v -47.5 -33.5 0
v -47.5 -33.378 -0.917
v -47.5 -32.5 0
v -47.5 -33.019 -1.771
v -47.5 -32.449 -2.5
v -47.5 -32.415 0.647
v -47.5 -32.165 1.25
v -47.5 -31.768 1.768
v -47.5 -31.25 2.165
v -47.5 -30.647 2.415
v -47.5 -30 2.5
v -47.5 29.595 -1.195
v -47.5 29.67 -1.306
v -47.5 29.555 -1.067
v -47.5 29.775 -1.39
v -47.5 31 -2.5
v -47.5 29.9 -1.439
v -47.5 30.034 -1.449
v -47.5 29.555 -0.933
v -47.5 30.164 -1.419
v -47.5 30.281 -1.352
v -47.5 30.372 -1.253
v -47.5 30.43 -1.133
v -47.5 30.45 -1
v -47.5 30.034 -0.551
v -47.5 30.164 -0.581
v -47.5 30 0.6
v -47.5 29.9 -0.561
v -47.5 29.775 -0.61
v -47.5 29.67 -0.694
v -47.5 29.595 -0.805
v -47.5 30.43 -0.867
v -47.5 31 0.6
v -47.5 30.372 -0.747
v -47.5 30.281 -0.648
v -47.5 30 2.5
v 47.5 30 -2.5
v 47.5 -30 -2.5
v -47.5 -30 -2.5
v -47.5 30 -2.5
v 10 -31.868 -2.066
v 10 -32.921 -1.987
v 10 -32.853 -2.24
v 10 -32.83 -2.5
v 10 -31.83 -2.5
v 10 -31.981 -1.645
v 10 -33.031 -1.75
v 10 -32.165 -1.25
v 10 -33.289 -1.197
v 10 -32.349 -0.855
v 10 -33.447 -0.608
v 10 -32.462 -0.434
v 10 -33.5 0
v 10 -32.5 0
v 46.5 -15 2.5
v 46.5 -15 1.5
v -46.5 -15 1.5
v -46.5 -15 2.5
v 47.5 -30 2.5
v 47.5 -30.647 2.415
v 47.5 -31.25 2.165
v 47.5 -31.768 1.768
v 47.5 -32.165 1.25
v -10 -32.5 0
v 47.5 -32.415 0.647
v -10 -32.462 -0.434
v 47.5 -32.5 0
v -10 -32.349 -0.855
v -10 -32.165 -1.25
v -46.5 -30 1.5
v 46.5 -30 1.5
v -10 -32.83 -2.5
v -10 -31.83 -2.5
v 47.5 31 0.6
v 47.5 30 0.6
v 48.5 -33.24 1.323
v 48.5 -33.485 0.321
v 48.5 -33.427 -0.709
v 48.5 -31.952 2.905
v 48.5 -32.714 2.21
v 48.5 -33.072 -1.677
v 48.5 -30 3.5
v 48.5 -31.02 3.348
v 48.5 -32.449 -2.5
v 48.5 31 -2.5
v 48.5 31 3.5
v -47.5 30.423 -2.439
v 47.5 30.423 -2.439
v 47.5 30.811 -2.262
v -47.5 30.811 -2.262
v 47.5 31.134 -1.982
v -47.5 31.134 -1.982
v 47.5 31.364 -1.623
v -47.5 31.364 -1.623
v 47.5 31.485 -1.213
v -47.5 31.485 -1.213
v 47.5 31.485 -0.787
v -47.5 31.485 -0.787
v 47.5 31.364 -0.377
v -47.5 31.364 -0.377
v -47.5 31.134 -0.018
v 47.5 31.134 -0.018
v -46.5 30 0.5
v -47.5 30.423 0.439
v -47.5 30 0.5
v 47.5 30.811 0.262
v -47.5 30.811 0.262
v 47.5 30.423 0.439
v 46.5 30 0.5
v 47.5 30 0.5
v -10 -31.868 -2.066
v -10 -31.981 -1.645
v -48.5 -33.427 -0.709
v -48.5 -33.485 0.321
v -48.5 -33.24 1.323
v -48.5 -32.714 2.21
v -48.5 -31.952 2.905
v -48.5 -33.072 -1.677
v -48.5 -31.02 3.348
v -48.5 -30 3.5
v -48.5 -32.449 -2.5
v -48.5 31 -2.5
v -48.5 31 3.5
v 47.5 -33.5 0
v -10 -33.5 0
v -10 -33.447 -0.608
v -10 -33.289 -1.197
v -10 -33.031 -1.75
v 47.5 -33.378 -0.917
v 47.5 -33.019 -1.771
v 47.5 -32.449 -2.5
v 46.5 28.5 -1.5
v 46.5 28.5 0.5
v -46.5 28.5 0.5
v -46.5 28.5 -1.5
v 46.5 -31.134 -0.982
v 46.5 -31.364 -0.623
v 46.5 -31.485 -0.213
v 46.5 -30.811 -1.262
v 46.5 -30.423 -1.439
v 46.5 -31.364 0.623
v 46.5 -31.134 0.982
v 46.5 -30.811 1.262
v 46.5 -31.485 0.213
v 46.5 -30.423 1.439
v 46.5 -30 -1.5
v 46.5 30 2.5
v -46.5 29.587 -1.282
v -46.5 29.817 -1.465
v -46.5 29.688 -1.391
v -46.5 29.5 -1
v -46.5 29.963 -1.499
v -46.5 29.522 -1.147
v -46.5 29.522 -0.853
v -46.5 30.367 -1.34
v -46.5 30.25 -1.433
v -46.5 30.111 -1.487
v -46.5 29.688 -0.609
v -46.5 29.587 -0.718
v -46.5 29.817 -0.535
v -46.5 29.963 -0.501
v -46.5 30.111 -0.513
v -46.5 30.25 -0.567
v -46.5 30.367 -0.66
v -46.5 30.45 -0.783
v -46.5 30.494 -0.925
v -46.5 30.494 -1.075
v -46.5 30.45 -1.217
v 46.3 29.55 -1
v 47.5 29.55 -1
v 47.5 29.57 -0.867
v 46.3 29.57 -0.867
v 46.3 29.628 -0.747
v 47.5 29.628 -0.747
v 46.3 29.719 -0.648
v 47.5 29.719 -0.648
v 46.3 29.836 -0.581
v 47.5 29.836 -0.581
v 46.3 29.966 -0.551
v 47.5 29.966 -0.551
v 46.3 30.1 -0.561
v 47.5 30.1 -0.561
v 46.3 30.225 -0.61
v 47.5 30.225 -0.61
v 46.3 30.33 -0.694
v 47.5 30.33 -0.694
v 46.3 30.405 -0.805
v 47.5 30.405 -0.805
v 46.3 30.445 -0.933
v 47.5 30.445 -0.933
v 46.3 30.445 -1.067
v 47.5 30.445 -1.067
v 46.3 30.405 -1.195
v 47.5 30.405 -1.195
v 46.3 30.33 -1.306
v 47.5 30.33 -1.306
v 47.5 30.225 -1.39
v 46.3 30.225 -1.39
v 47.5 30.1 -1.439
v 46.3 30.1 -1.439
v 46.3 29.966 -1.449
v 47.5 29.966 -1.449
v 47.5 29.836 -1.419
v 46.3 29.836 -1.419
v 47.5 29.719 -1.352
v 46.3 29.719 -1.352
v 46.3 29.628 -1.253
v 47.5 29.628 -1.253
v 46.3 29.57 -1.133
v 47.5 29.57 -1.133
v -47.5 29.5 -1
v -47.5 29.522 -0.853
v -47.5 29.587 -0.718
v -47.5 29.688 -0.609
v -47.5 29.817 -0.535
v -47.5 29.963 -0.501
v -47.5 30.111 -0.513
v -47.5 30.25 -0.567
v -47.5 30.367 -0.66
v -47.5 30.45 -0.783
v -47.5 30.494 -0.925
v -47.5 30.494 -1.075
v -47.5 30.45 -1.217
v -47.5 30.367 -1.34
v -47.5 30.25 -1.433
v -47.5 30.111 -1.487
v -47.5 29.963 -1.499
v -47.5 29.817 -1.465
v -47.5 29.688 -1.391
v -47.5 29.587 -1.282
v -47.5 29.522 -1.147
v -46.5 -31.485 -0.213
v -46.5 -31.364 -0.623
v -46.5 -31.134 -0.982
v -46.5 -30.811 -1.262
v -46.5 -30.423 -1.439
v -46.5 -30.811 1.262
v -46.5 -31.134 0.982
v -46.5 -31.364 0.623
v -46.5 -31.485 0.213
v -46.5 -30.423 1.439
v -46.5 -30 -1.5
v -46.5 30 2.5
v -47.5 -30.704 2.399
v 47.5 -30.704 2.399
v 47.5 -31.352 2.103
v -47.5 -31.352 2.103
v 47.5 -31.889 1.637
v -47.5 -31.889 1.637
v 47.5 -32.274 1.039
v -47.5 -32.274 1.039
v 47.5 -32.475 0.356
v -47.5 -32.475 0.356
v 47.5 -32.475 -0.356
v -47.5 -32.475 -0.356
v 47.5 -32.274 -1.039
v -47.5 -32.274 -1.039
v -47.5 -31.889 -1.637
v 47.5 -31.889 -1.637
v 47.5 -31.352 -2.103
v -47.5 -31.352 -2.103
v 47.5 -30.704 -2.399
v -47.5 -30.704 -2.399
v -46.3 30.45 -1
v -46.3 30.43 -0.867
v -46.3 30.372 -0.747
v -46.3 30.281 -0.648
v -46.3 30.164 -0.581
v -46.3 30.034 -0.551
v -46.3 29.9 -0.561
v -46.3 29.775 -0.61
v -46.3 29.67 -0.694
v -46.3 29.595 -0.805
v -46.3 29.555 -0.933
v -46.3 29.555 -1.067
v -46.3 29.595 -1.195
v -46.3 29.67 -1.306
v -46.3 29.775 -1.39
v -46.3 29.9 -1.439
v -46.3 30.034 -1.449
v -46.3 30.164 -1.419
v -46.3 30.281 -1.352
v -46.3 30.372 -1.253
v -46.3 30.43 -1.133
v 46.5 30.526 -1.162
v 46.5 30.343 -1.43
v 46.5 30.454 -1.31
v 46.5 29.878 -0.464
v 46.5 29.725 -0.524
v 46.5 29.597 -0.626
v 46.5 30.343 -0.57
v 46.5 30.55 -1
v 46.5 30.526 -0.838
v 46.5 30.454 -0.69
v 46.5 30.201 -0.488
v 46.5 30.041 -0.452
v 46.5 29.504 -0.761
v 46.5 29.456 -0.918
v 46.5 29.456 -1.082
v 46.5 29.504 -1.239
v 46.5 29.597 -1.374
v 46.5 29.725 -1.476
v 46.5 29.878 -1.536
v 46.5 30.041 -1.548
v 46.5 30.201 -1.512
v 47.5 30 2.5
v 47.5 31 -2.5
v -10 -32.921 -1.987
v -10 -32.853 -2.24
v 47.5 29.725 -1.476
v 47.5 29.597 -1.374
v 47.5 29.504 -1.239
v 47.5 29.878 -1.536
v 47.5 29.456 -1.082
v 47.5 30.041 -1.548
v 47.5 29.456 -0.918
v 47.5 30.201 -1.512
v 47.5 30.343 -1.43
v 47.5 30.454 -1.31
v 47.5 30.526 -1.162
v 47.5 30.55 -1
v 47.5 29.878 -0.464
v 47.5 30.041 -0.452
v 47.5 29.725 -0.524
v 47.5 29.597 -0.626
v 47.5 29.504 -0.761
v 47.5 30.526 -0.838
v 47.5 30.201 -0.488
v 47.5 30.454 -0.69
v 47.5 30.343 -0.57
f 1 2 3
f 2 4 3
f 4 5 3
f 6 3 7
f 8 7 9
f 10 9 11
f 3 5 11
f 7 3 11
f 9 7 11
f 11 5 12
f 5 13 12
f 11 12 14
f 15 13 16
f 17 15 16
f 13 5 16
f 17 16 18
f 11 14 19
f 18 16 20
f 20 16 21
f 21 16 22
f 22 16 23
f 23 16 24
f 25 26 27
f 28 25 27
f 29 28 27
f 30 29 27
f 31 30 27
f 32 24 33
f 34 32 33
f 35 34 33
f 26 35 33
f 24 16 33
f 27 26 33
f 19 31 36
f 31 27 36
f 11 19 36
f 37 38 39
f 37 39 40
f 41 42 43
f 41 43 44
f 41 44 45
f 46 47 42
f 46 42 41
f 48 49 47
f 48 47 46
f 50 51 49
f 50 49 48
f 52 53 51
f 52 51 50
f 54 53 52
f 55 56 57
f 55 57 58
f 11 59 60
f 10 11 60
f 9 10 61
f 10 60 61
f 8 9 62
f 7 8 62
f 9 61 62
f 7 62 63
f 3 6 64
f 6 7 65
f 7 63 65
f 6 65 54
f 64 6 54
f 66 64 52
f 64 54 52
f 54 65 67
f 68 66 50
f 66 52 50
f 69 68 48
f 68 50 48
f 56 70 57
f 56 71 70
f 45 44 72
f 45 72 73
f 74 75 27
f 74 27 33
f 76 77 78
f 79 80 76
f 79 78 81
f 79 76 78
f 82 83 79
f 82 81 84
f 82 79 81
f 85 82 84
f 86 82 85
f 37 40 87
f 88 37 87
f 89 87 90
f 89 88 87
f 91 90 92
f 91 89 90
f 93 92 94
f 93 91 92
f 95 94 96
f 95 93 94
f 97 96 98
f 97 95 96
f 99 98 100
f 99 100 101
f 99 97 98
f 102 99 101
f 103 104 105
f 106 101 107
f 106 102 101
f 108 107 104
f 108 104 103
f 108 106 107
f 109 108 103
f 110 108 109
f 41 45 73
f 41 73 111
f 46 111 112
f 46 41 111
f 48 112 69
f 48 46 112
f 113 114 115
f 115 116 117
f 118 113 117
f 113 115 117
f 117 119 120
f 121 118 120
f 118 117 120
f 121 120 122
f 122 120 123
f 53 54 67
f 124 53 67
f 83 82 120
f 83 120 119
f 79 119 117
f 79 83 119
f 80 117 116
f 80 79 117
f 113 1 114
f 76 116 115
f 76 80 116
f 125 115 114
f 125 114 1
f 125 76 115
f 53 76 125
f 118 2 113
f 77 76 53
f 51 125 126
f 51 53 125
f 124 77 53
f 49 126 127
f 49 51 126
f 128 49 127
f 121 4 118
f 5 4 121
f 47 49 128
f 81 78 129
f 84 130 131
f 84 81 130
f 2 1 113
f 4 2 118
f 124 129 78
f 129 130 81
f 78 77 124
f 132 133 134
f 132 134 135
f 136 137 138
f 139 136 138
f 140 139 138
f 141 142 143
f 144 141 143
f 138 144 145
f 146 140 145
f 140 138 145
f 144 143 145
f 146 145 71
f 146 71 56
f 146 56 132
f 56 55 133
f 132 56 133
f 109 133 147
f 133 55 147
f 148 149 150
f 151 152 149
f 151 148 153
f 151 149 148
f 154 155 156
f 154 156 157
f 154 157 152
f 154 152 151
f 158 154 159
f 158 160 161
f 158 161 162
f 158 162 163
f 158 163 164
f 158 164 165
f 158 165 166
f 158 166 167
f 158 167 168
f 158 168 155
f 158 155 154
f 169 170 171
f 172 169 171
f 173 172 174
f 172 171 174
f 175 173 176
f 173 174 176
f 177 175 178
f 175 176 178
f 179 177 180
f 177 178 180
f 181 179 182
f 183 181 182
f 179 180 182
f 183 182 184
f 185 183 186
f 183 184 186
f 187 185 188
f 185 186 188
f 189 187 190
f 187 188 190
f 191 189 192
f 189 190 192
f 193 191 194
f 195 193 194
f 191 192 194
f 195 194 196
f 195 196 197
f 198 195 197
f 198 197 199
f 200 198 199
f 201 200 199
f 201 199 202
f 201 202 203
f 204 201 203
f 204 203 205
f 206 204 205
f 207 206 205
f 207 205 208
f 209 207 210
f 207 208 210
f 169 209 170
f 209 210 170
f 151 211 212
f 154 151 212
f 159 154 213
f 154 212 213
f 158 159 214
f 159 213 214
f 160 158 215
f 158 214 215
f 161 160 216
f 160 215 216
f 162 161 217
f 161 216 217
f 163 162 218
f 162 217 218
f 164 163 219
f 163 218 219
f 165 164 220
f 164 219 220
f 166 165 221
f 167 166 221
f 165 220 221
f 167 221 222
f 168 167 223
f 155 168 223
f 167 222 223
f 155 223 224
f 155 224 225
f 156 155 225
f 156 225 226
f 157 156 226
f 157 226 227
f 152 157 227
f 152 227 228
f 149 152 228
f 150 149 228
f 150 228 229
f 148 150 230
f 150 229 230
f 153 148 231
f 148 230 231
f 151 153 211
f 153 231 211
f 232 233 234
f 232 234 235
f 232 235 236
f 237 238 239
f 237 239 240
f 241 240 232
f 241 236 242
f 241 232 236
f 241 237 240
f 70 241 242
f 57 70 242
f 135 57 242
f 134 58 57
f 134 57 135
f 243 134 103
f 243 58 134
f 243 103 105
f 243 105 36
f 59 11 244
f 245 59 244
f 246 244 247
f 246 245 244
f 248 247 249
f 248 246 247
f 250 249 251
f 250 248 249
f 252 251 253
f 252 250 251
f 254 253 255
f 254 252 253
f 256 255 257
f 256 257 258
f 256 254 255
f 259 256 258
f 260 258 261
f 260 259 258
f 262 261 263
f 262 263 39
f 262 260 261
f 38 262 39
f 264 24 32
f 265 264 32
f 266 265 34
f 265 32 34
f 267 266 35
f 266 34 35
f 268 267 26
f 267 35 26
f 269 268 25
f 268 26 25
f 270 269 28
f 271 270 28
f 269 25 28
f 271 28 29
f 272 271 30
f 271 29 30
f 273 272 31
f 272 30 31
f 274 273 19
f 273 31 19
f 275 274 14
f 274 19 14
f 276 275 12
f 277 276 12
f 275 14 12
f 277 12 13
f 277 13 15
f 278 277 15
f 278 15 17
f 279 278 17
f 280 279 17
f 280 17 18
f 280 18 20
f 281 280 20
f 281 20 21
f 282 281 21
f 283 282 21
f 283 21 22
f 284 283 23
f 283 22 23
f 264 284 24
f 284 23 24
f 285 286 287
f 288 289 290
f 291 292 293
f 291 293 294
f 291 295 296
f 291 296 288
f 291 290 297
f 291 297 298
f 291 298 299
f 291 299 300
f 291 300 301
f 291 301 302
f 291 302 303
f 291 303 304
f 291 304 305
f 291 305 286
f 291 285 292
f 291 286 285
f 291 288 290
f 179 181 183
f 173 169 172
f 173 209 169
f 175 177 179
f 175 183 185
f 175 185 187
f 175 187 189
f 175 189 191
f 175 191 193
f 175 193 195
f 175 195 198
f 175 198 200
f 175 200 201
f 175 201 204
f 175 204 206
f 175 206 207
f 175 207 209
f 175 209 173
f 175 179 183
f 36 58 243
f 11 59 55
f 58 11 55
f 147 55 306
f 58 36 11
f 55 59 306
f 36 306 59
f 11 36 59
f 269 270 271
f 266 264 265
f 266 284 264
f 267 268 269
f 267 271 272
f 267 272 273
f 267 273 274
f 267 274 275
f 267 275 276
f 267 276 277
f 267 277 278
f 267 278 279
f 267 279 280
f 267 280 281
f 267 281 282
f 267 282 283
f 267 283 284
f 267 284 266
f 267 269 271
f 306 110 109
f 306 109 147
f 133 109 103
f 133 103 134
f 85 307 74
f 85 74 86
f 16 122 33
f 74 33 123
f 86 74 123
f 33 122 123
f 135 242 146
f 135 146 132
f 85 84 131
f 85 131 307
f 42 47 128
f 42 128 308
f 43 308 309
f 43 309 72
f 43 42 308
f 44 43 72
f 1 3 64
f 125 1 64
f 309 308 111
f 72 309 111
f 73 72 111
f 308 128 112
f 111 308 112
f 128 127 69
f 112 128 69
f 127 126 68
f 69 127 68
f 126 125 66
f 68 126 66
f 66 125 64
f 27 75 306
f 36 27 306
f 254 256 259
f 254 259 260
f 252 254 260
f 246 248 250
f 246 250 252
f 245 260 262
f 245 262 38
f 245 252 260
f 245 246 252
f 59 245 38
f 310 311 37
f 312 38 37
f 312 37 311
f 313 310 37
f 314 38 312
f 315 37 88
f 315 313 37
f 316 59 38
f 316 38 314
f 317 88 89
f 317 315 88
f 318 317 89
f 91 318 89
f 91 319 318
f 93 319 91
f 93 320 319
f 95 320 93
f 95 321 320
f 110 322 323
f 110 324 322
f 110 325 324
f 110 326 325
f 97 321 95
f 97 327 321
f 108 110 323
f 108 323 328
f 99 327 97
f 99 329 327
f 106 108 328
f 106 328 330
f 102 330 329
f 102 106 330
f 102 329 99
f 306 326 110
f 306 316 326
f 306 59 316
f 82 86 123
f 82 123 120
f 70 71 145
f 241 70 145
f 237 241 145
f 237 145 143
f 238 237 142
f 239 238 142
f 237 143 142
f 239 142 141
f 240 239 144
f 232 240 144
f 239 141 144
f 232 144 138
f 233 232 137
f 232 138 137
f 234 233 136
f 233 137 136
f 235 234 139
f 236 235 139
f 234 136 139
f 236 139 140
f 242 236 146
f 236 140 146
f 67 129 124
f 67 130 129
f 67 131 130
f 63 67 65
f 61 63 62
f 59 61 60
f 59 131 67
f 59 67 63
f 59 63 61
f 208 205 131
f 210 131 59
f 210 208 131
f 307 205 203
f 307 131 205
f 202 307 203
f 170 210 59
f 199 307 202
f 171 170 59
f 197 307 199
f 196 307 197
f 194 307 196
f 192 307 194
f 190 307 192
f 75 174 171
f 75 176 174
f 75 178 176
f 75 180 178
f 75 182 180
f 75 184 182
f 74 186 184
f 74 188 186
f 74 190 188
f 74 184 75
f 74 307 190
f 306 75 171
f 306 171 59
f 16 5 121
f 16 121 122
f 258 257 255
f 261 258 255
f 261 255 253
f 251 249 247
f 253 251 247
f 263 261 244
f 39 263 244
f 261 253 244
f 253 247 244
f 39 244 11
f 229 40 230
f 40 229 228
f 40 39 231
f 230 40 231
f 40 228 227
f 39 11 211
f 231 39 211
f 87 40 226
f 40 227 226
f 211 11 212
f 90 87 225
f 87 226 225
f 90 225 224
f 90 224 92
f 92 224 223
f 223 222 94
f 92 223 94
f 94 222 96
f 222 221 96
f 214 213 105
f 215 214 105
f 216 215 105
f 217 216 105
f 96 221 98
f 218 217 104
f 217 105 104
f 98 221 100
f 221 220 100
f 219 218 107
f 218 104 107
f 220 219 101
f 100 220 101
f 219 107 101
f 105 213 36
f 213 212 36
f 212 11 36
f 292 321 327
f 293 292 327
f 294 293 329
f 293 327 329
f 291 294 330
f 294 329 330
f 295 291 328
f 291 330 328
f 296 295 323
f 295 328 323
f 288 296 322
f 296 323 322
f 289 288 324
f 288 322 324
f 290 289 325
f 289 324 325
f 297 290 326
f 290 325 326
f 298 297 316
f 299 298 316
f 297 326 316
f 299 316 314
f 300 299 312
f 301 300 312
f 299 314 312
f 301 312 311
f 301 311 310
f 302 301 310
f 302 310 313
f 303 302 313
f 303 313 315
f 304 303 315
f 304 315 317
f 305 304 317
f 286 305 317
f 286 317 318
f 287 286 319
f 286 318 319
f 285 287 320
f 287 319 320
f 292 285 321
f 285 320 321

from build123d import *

# Parameters (mm, degrees)
F1_DEPTH       = 47.5
F2_T           = 1
F3_W           = 15
F3_H           = 1
F4_DEPTH       = 46.5
F4_DEPTH_BACK  = 46.5
F6_DEPTH       = 47.5
F6_DEPTH_BACK  = 47.5
F7_R           = 0.55
F8_DEPTH       = 1
F9_R           = 0.5
F10_DEPTH      = 1
F12_DEPTH      = 48.5
F13_T          = 1
F15_W          = 37.5
F15_H          = 10.6723425663
F16_DEPTH      = 144
F18_DEPTH      = 20
F20_DEPTH      = 20
F21_W          = 1
F21_H          = 2.9
F22_DEPTH      = 48.5
F22_DEPTH_BACK = 48.5
F23_R          = 0.45
F24_DEPTH      = 1.2
F25_R          = 0.45
F26_DEPTH      = 1.2


# Not quite as in the source:
# - an extrude ends at something that could not be found from the text; its depth is read off the source's solid
# - ends of sketch curves that miss each other by under 0.0002 mm in the source are joined
# - a shell that OpenCascade refuses in one call is made with other operations: the cavity is built on its own and cut out


with BuildPart() as f1:
    # F0 (on Right) → F1 (new body, symmetric)
    with BuildSketch(Plane.YZ):
        with BuildLine():
            Line((30, 2.5), (-30, 2.5))
            ThreePointArc((-30, 2.5), (-32.5, 0), (-30, -2.5))
            Line((-30, -2.5), (30, -2.5))
            Line((30, -2.5), (30, 2.5))
        make_face()
    extrude(amount=F1_DEPTH, both=True)

    # F2: shell of thickness 1, made by hand


with BuildPart() as f2_core1:
    # F2_t2: copy of F1
    add(f1.part)

    # the walls: a layer under each face that stays
    f2_faces = [f2_core1.faces().sort_by_distance(p)[0] for p in [
        (0, 0, -2.5),
        (47.5, -1.25, 0),
        (0, -32.5, 0),
        (-47.5, -1.25, 0),
    ]]
    thicken(f2_faces, amount=-F2_T, mode=Mode.SUBTRACT)


with BuildPart() as f1_1:
    add(f1.part)

    # what is left inside the walls is the cavity
    f2_cavity = [f2_core1.part.solids().sort_by_distance(p)[0] for p in [
        (-15.5, 0, 2.49),
    ]]
    add(f2_cavity, mode=Mode.SUBTRACT)

    # F3 (on Right) → F4 (join, two sides)
    with BuildSketch(Plane.YZ) as f4_sk:
        with Locations((-22.5, 2)):
            Rectangle(F3_W, F3_H)
    extrude(amount=F4_DEPTH)
    extrude(f4_sk.sketch, amount=-F4_DEPTH_BACK)

    # F5 (on Right) → F6 (join, two sides)
    with BuildSketch(Plane.YZ) as f6_sk:
        with BuildLine():
            Line((28.5, -2.5), (29.9848040611, -2.5))
            ThreePointArc((29.9848040611, -2.5), (29.9924019331, -2.4999807563), (30, -2.5))
            Line((30, -2.5), (30, 0.5))
            Line((30, 0.5), (28.5, 0.5))
            Line((28.5, 0.5), (28.5, -2.5))
        make_face()
        with BuildLine():
            Line((30, 0.5), (30, -2.5))
            ThreePointArc((30, -2.5), (31.5, -1), (30, 0.5))
        make_face()
    extrude(amount=F6_DEPTH)
    extrude(f6_sk.sketch, amount=-F6_DEPTH_BACK)

    # F7 (on face) → F8 (cut)
    with BuildSketch(Plane.YZ.offset(47.5)):
        with Locations((30, -1)):
            Circle(F7_R)
    extrude(amount=-F8_DEPTH, mode=Mode.SUBTRACT)

    # F9 (on face) → F10 (cut)
    with BuildSketch(Plane(origin=(-47.5, 0, 0), x_dir=(0, -1, 0), z_dir=(-1, 0, 0))):
        with Locations((-30, -1)):
            Circle(F9_R)
    extrude(amount=-F10_DEPTH, mode=Mode.SUBTRACT)


with BuildPart() as f12:
    # F11 (on Right) → F12 (new body, symmetric)
    with BuildSketch(Plane.YZ):
        with BuildLine():
            Line((31, 3.5), (-30, 3.5))
            ThreePointArc((-30, 3.5), (-33.2403703492, 1.3228756555), (-32.4494897428, -2.5))
            Line((-32.4494897428, -2.5), (-30, -2.5))
            Line((-30, -2.5), (31, -2.5))
            Line((31, -2.5), (31, 3.5))
        make_face()
    extrude(amount=F12_DEPTH, both=True)

    # F13: shell of thickness 1, made by hand


with BuildPart() as f13_core1:
    # F13_t2: copy of F12
    add(f12.part)

    # the walls: a layer under each face that stays
    f13_faces = [f13_core1.faces().sort_by_distance(p)[0] for p in [
        (0, 0.5, 3.5),
        (48.5, -1.25, 0.5),
        (0, -33.2403703492, 1.3228756555),
        (-48.5, -1.25, 0.5),
    ]]
    thicken(f13_faces, amount=-F13_T, mode=Mode.SUBTRACT)


with BuildPart() as f12_1:
    add(f12.part)

    # what is left inside the walls is the cavity
    f13_cavity = [f13_core1.part.solids().sort_by_distance(p)[0] for p in [
        (-15.833333, -0.724745, -2.49),
    ]]
    add(f13_cavity, mode=Mode.SUBTRACT)

    # F15 (on offset) → F16 (cut, through all)
    with BuildSketch(Plane.XZ.offset(30)):
        with Locations((-28.75, -5.3361712831)):
            Rectangle(F15_W, F15_H)
        with Locations((28.75, -5.3361712831)):
            Rectangle(F15_W, F15_H)
    extrude(amount=F16_DEPTH, mode=Mode.SUBTRACT)

    # F17 (on face) → F18 (cut, through all)
    with BuildSketch(Plane.YZ.offset(10)):
        with BuildLine():
            Line((-32.1650635095, -1.25), (-33.0310889132, -1.75))
            ThreePointArc((-33.0310889132, -1.75), (-32.7658290983, -2.1448052123), (-32.4494897428, -2.5))
            Line((-32.4494897428, -2.5), (-30, -2.5))
            ThreePointArc((-30, -2.5), (-31.25, -2.1650635095), (-32.1650635095, -1.25))
        make_face()
    extrude(amount=-F18_DEPTH, mode=Mode.SUBTRACT)

    # F19 (on face) → F20 (join, through all)
    with BuildSketch(Plane.YZ.offset(10)):
        with BuildLine():
            ThreePointArc((-33.0310889132, -1.75), (-32.8812382795, -2.1117714323), (-32.8301270189, -2.5))
            Line((-32.8301270189, -2.5), (-31.8301270189, -2.5))
            ThreePointArc((-31.8301270189, -2.5), (-31.9153124532, -1.8529523872), (-32.1650635095, -1.25))
            Line((-32.1650635095, -1.25), (-33.0310889132, -1.75))
        make_face()
    extrude(amount=-F20_DEPTH)

    # F21 (on Right) → F22 (join, two sides)
    with BuildSketch(Plane.YZ) as f22_sk:
        with Locations((30.5, 2.05)):
            Rectangle(F21_W, F21_H)
    extrude(amount=F22_DEPTH)
    extrude(f22_sk.sketch, amount=-F22_DEPTH_BACK)

    # F23 (on face) → F24 (join)
    with BuildSketch(Plane.YZ.offset(-47.5)):
        with Locations((30, -1)):
            Circle(F23_R)
    extrude(amount=F24_DEPTH)

    # F25 (on face) → F26 (join)
    with BuildSketch(Plane(origin=(47.5, 0, 0), x_dir=(0, -1, 0), z_dir=(-1, 0, 0))):
        with Locations((-30, -1)):
            Circle(F25_R)
    extrude(amount=F26_DEPTH)


solid = Compound([f1_1.part, f12_1.part])
